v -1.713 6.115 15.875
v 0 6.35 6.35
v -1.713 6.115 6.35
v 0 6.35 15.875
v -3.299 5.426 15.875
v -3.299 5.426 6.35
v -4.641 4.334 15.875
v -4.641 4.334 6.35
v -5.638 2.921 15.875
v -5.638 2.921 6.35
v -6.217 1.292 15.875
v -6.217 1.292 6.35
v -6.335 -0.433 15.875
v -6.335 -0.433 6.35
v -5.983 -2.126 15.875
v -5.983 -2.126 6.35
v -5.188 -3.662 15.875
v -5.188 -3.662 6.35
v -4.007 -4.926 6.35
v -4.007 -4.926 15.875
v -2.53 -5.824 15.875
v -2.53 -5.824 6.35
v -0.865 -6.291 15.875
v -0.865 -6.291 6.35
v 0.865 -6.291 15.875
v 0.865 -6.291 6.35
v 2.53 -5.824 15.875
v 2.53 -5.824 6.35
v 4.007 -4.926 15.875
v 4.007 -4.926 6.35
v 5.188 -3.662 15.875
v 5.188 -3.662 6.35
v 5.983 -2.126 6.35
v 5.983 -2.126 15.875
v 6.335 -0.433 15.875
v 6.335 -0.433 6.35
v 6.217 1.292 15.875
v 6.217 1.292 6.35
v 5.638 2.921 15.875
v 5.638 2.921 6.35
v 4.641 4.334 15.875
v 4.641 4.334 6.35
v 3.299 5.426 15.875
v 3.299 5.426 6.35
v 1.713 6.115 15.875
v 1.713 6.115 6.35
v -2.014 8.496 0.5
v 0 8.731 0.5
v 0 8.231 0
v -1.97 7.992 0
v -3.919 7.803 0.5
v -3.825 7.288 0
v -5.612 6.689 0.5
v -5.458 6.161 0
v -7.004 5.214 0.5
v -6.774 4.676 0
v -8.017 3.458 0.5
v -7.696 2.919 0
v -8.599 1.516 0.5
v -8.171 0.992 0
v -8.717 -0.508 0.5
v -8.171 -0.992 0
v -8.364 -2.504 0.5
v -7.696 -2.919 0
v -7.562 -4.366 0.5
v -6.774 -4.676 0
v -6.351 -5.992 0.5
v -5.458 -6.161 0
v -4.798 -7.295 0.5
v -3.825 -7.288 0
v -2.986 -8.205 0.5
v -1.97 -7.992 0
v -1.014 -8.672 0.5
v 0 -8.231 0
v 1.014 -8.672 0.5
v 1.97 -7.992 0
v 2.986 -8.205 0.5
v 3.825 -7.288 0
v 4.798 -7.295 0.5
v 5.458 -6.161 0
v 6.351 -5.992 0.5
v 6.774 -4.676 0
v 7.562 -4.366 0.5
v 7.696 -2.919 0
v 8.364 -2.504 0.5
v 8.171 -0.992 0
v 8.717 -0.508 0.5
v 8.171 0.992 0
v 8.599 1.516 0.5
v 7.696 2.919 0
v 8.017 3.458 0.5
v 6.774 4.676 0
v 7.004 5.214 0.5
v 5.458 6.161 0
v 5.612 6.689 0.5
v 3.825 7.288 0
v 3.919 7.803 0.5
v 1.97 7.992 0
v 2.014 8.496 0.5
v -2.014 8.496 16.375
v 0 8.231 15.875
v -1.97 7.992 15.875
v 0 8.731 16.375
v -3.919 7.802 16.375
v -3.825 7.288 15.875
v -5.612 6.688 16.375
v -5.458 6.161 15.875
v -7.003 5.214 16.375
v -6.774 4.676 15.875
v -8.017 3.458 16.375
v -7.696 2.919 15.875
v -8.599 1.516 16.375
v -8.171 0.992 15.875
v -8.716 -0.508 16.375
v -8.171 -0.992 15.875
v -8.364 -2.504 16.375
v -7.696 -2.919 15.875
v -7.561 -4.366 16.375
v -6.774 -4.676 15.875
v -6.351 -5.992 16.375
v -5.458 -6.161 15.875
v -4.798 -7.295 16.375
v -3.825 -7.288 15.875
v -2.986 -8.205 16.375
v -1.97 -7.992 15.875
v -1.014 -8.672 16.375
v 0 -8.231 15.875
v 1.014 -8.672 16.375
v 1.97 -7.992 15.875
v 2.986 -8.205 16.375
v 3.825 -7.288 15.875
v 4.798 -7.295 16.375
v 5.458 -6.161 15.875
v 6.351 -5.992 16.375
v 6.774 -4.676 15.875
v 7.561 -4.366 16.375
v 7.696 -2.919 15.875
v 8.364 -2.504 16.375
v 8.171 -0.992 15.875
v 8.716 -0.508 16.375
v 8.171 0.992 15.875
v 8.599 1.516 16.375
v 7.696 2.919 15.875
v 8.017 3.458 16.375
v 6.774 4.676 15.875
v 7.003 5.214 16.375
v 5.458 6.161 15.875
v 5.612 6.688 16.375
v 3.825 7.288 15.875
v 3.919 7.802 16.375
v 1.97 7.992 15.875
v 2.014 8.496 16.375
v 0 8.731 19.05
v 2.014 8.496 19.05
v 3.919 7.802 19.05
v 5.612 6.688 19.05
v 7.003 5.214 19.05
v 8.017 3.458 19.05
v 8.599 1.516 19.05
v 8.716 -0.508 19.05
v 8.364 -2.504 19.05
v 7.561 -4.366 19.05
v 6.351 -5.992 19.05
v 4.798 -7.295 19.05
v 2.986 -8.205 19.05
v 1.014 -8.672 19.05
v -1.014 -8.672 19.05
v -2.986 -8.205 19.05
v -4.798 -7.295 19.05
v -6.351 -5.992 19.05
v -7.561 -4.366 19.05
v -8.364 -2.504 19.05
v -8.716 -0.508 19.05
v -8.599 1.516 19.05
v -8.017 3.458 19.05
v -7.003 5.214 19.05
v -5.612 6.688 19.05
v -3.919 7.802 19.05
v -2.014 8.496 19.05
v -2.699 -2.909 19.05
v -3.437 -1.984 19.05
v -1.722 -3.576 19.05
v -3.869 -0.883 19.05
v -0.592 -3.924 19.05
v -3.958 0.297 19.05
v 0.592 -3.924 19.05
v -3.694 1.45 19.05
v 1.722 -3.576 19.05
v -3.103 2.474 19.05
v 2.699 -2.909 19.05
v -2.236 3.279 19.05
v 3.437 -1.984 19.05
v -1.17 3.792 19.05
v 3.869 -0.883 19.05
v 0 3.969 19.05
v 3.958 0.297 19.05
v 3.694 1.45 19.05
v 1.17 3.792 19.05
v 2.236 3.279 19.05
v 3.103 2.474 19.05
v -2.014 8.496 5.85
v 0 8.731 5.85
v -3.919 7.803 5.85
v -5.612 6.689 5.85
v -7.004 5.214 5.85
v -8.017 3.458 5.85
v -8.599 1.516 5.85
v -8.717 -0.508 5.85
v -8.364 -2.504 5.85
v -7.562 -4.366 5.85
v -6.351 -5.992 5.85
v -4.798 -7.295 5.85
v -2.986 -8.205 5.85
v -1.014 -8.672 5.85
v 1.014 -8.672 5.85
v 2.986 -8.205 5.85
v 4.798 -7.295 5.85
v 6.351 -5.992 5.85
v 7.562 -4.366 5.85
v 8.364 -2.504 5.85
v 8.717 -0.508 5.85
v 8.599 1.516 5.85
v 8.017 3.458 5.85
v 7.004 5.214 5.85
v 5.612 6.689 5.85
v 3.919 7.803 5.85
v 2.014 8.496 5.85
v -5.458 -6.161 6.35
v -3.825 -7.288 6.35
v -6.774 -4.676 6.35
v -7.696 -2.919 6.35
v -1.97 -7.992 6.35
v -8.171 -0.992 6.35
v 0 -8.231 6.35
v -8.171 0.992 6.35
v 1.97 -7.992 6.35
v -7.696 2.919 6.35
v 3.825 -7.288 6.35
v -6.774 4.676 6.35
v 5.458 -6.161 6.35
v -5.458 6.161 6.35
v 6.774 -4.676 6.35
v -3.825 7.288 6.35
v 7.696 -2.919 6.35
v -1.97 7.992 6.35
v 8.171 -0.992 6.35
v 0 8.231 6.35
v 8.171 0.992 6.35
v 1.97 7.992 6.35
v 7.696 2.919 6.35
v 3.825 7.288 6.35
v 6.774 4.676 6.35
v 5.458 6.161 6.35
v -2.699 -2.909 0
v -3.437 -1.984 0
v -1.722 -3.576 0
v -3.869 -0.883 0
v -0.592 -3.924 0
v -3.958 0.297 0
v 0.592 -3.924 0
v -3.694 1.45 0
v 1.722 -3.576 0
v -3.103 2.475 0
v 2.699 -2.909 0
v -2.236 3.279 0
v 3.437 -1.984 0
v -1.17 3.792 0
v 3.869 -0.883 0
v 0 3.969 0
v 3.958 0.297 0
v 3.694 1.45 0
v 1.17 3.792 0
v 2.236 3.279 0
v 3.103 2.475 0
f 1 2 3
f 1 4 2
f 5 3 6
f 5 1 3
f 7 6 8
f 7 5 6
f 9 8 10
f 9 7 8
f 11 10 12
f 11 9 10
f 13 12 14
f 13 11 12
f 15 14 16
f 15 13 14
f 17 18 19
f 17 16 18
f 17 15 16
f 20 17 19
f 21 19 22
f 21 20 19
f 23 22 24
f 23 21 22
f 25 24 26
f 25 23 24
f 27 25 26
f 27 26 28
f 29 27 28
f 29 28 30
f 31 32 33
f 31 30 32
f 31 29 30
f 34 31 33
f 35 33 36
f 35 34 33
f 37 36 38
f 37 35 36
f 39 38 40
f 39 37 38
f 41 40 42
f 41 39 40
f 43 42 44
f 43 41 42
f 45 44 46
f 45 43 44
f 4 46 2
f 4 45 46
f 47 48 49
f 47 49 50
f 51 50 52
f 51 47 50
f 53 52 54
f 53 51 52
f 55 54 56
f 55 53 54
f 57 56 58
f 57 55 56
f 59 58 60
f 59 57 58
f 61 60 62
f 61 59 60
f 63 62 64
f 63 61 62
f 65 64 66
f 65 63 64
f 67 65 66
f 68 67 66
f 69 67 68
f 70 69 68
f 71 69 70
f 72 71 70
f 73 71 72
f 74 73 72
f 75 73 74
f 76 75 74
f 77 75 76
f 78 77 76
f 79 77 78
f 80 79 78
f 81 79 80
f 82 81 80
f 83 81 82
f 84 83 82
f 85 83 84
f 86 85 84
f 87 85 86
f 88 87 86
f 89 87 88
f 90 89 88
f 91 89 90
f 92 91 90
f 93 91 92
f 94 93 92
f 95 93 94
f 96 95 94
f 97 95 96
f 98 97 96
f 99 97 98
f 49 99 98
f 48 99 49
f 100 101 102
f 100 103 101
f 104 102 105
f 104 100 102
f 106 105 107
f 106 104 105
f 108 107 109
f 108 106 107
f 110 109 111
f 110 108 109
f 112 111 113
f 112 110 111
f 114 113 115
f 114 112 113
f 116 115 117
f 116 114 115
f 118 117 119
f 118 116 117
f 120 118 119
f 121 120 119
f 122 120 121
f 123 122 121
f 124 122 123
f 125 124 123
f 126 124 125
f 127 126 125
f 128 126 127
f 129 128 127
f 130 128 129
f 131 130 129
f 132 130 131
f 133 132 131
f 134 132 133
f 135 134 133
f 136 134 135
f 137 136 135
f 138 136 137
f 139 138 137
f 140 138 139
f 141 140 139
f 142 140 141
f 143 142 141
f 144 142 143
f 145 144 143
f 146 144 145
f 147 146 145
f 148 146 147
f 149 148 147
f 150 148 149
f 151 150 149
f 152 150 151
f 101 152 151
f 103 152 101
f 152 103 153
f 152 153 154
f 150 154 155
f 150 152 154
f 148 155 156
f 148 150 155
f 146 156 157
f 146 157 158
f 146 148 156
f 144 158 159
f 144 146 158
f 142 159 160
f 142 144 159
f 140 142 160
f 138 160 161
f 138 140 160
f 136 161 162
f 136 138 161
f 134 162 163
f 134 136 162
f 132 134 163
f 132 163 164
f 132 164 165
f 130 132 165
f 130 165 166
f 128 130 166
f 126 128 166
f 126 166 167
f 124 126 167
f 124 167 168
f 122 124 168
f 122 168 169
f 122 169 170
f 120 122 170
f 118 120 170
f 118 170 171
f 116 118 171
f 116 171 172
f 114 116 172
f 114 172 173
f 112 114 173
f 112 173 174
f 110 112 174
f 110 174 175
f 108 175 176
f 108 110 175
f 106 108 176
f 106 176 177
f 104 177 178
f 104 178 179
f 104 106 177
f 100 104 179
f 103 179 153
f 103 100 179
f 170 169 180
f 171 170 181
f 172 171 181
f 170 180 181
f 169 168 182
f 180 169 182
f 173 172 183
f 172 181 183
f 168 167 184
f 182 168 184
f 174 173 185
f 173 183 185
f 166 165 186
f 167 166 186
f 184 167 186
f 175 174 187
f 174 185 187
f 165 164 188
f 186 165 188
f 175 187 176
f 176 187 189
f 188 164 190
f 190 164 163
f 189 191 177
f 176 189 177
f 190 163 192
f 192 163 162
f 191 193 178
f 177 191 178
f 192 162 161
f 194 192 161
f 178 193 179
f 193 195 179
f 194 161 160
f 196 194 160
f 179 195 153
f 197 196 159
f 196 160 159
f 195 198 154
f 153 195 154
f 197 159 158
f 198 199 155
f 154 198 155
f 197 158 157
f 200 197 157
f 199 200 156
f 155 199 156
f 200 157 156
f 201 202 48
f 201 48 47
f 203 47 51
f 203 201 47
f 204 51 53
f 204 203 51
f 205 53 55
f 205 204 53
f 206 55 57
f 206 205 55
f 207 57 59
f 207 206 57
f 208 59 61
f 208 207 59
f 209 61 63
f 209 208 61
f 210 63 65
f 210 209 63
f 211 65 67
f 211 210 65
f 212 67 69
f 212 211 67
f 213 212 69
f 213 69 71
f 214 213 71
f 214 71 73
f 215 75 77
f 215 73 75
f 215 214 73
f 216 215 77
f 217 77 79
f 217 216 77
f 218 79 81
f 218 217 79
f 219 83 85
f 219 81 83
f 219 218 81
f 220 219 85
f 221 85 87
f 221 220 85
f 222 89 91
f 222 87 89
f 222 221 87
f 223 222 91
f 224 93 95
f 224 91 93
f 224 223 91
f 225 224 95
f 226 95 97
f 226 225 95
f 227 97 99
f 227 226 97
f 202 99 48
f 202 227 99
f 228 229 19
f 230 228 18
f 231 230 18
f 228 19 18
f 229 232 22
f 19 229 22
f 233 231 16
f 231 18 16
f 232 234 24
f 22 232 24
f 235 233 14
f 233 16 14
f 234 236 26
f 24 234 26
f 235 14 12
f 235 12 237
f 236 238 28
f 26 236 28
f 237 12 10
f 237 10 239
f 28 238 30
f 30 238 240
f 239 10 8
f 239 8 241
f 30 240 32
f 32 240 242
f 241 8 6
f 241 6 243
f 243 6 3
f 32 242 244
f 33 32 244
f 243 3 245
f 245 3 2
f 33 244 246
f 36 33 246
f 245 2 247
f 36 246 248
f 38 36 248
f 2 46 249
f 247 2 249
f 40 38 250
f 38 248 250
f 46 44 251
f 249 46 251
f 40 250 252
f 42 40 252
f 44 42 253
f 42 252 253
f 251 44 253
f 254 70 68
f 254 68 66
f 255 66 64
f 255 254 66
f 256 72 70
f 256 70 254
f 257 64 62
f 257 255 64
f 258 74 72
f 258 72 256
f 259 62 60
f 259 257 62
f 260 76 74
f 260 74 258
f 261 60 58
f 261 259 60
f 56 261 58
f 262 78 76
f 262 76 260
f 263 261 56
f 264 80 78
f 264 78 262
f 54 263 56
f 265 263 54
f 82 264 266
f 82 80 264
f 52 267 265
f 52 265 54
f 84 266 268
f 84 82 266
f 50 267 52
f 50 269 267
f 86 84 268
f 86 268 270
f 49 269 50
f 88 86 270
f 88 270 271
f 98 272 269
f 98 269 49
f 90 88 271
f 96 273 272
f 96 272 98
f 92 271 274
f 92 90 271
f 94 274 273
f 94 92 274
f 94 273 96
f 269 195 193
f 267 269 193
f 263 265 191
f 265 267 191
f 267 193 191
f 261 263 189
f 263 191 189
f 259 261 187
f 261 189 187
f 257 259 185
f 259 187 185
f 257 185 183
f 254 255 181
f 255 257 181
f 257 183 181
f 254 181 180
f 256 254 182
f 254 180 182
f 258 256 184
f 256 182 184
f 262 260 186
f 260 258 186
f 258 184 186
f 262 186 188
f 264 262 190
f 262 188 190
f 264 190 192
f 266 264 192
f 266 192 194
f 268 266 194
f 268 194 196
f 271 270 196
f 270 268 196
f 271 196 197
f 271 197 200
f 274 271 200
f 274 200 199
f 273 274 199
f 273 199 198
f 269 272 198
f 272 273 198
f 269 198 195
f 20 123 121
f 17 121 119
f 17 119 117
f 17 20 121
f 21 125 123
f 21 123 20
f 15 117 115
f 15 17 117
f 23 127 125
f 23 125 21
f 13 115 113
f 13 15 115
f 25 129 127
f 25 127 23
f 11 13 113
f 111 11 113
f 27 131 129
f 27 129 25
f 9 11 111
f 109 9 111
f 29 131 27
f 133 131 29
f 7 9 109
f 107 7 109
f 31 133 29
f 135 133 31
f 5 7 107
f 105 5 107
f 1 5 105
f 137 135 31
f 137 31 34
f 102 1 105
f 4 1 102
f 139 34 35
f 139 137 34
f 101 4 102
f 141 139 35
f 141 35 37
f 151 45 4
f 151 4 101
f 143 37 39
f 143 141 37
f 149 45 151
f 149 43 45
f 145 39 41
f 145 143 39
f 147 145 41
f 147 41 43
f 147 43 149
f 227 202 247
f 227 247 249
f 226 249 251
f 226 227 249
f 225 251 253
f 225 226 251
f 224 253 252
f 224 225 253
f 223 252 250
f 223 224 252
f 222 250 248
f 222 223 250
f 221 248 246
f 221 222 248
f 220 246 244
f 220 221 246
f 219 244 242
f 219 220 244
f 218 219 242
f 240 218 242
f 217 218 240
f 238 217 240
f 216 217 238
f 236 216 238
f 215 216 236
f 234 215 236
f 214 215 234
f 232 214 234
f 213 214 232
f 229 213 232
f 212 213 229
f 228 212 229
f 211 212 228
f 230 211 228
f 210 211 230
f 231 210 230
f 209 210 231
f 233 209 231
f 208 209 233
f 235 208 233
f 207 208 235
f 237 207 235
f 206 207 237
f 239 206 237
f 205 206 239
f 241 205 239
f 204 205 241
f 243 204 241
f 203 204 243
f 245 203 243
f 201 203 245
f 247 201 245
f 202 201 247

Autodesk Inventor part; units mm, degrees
ref_plane "YZ Plane" through (0, 0, 0) normal (1, 0, 0) x (0, 1, 0)
ref_plane "XZ Plane" through (0, 0, 0) normal (0, 1, 0) x (-1, 0, 0)
ref_plane "XY Plane" through (0, 0, 0) normal (0, 0, 1) x (1, 0, 0)
sketch "Sketch1" plane through (0, 0, 0) normal (1, 0, 0) x (0, 1, 0)
  line L0 (0, 0) -> (3.9688, 0) construction
  line L1 (3.9688, 0) -> (3.9687, 19.05)
  line L2 (3.9687, 19.05) -> (0, 19.05) construction
  line L3 (0, 19.05) -> (0, 0) construction
  line L4 (3.9688, 0) -> (6.35, 0)
  line L5 (6.35, 0) -> (6.35, 19.05)
  line L6 (6.35, 19.05) -> (3.9687, 19.05)
  line L7 (3.9687, 19.05) -> (3.9688, 0)
  line L8 (6.35, 0) -> (8.7313, 0)
  line L9 (8.7313, 0) -> (8.7312, 6.35)
  line L10 (8.7312, 6.35) -> (6.35, 6.35)
  line L11 (6.35, 6.35) -> (6.35, 0)
  line L12 (6.35, 19.05) -> (8.7312, 19.05)
  line L13 (8.7312, 19.05) -> (8.7312, 15.875)
  line L14 (8.7312, 15.875) -> (6.35, 15.875)
  line L15 (6.35, 15.875) -> (6.35, 19.05)
  point P0 (6.35, 6.35)
  point P1 (6.35, 15.875)
  dimension "d0" = 3.9688
  dimension "d1" = 19.05
  dimension "d2" = 2.3813
  dimension "d3" = 2.3813
  dimension "d4" = 6.35
  dimension "d5" = 2.3813
  dimension "d8" = 9.525
revolve "Revolution1" add sketch "Sketch1" angle 360 about axis through (0, 0, 19.05) along (0, 0, -1)
chamfer "Chamfer1" distance 0.5 angle 45 3 edges at (0, -8.7313, 0) (0, -8.7312, 6.35) (0, -8.7312, 15.875)
equation "\"d5\" = d3"
properties part number "Spring Anchor" material "Nylon 6/6"
